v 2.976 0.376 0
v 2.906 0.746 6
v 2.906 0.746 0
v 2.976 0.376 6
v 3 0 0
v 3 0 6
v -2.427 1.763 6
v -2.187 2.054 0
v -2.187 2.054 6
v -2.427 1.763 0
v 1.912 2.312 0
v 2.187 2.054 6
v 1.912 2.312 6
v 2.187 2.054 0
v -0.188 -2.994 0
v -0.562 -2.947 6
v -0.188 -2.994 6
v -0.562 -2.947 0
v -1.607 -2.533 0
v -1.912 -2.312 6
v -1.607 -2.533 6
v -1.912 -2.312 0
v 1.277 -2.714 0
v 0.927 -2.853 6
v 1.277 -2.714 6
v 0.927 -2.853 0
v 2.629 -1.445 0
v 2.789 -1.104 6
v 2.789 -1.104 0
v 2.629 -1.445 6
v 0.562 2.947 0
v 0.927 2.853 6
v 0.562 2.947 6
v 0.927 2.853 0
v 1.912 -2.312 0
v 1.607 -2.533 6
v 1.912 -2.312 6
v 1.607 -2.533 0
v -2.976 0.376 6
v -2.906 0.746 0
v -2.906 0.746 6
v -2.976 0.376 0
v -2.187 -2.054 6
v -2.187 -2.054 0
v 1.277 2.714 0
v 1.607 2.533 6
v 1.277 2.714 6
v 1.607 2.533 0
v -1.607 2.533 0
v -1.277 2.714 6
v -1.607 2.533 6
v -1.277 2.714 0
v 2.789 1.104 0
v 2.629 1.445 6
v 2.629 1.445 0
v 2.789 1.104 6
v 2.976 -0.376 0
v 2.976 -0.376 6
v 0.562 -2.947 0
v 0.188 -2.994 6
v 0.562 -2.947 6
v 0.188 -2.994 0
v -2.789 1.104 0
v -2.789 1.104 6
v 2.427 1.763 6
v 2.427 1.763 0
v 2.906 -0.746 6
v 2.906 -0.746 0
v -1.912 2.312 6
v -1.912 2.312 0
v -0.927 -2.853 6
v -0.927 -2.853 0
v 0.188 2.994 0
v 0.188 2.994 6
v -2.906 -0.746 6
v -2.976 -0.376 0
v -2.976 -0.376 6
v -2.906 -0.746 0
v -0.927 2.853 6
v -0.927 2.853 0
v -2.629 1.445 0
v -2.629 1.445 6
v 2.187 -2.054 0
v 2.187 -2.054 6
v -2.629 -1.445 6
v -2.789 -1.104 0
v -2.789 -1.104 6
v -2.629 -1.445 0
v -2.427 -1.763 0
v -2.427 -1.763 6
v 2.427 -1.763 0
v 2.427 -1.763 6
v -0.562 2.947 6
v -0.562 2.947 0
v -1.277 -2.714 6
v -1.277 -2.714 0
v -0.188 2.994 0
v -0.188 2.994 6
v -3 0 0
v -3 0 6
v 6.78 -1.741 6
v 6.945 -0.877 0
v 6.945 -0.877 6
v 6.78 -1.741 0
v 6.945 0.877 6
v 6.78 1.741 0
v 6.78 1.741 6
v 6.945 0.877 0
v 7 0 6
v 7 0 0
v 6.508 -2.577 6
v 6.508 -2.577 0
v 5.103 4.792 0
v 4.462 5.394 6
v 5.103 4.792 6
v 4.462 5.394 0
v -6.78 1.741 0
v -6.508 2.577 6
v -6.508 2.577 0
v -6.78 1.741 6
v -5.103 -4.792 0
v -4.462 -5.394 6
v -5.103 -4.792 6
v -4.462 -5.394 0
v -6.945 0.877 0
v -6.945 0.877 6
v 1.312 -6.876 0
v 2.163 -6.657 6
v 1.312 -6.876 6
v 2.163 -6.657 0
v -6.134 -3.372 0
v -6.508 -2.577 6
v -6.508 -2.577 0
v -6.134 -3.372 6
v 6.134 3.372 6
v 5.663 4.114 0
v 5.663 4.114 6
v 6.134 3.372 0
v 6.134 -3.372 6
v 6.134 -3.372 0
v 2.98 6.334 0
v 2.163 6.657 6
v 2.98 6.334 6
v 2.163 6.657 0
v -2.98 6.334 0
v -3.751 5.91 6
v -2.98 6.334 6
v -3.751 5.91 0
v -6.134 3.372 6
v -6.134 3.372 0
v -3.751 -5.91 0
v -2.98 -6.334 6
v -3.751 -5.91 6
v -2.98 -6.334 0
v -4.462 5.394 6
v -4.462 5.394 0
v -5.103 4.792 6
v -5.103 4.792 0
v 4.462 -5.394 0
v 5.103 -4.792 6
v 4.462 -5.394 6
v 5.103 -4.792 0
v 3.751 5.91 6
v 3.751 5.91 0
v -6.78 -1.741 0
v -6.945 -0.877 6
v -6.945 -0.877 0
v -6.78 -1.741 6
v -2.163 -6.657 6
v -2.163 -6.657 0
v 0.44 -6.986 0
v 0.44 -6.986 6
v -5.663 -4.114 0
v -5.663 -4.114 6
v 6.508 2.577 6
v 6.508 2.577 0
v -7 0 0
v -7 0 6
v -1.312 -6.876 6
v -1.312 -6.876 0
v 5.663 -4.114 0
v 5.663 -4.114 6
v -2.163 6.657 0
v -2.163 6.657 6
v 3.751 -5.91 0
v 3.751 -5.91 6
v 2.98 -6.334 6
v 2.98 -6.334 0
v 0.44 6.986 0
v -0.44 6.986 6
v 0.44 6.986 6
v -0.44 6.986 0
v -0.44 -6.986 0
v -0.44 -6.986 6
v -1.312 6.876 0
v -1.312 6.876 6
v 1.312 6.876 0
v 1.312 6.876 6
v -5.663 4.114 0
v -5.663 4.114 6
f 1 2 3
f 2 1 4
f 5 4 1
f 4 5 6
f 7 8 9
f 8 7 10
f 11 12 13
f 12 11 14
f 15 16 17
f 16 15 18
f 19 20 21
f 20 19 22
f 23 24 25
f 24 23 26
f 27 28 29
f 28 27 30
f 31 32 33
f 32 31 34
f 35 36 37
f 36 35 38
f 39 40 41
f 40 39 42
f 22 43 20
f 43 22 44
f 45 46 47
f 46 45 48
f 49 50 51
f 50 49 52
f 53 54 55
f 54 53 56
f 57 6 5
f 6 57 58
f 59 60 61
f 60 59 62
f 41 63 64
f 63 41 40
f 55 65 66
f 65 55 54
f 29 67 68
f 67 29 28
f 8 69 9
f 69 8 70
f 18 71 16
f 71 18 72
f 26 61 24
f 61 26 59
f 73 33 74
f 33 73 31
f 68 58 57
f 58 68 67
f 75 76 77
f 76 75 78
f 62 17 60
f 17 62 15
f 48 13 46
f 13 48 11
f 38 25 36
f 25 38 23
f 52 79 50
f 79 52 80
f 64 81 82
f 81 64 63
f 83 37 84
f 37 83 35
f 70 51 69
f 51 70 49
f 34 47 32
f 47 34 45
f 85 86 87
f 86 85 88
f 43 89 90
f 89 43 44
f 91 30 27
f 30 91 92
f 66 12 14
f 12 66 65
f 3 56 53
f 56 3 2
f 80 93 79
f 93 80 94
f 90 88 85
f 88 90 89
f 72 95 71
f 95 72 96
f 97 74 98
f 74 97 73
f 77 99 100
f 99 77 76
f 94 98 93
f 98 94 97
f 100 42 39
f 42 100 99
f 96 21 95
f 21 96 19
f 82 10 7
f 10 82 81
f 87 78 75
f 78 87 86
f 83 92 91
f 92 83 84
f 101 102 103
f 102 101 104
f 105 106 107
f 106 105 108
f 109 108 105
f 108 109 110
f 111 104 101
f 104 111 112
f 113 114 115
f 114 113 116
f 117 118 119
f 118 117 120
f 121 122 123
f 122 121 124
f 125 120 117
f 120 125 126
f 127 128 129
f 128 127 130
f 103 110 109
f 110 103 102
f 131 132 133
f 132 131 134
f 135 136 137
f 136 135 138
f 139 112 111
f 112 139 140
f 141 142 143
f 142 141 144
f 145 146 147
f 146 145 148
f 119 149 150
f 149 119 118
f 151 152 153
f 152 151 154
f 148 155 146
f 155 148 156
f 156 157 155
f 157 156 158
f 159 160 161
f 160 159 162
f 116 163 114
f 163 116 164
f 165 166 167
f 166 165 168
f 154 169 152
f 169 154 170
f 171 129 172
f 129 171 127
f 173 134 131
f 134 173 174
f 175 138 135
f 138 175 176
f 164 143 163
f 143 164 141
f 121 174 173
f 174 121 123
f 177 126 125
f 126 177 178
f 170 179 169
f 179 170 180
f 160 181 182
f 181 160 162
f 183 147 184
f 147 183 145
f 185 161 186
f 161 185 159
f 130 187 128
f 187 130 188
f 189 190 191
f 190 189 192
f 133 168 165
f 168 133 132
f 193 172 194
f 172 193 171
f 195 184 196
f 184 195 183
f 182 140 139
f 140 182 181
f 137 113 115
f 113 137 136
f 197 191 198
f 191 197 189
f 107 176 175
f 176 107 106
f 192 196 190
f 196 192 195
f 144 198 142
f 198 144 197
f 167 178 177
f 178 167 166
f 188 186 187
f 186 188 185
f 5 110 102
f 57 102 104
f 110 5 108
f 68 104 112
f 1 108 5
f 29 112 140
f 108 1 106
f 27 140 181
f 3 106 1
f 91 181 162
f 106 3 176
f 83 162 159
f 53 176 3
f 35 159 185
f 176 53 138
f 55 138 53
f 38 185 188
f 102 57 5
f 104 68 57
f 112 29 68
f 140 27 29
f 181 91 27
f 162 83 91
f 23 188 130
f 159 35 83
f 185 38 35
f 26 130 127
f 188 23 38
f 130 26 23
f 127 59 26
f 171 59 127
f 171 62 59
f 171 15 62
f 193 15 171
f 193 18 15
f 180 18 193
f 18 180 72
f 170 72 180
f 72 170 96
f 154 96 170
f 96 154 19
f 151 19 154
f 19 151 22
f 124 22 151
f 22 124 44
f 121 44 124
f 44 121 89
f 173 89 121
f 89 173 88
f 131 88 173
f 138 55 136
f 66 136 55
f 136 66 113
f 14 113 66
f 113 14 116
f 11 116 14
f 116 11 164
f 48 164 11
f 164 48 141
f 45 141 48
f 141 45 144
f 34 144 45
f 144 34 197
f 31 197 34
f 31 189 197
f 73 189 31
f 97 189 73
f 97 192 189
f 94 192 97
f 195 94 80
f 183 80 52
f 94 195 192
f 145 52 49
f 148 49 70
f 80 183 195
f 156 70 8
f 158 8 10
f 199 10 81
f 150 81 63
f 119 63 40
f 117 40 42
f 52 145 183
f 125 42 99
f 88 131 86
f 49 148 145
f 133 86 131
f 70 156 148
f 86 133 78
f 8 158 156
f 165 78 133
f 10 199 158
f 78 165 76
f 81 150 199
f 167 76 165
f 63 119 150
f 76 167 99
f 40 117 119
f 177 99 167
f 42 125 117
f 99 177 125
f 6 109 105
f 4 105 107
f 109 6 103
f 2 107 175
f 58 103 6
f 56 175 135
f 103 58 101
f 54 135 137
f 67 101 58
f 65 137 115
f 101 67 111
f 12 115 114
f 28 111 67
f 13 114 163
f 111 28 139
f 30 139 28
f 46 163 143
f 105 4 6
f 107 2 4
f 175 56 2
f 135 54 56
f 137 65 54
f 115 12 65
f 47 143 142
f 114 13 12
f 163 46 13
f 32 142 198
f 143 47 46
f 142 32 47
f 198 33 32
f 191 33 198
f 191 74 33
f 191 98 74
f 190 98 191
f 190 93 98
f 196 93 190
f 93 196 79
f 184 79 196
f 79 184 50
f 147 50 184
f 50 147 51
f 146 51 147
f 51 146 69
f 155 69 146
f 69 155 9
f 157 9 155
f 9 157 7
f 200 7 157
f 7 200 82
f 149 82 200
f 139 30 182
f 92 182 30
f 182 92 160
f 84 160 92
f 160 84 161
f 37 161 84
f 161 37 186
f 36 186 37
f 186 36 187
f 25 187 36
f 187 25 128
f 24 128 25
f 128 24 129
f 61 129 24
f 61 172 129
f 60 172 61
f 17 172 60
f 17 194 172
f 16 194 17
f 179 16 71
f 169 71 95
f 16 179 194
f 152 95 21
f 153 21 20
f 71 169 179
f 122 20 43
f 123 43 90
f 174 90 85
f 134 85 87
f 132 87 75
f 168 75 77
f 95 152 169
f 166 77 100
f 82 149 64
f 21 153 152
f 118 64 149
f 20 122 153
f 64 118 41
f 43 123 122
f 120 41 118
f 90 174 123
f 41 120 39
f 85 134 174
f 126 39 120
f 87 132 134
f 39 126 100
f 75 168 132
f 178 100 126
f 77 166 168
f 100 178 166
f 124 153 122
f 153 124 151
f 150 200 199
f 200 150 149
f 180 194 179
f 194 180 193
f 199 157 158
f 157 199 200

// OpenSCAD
$fn = 50;


difference() {
	union() {
		cylinder(h = 6, r = 7.0000000000);
	}
	union() {
		#translate(v = [0.0000000000, 0.0000000000, -100.0000000000]) {
			cylinder(h = 200, r = 3.0000000000);
		}
		#translate(v = [0.0000000000, 0.0000000000, -100.0000000000]) {
			cylinder(h = 200, r = 3.0000000000);
		}
		#translate(v = [0.0000000000, 0.0000000000, -100.0000000000]) {
			cylinder(h = 200, r = 3.0000000000);
		}
		#translate(v = [0.0000000000, 0.0000000000, -100.0000000000]) {
			cylinder(h = 200, r = 3.0000000000);
		}
		#cylinder(h = 6, r = 2.0000000000);
	}
}
